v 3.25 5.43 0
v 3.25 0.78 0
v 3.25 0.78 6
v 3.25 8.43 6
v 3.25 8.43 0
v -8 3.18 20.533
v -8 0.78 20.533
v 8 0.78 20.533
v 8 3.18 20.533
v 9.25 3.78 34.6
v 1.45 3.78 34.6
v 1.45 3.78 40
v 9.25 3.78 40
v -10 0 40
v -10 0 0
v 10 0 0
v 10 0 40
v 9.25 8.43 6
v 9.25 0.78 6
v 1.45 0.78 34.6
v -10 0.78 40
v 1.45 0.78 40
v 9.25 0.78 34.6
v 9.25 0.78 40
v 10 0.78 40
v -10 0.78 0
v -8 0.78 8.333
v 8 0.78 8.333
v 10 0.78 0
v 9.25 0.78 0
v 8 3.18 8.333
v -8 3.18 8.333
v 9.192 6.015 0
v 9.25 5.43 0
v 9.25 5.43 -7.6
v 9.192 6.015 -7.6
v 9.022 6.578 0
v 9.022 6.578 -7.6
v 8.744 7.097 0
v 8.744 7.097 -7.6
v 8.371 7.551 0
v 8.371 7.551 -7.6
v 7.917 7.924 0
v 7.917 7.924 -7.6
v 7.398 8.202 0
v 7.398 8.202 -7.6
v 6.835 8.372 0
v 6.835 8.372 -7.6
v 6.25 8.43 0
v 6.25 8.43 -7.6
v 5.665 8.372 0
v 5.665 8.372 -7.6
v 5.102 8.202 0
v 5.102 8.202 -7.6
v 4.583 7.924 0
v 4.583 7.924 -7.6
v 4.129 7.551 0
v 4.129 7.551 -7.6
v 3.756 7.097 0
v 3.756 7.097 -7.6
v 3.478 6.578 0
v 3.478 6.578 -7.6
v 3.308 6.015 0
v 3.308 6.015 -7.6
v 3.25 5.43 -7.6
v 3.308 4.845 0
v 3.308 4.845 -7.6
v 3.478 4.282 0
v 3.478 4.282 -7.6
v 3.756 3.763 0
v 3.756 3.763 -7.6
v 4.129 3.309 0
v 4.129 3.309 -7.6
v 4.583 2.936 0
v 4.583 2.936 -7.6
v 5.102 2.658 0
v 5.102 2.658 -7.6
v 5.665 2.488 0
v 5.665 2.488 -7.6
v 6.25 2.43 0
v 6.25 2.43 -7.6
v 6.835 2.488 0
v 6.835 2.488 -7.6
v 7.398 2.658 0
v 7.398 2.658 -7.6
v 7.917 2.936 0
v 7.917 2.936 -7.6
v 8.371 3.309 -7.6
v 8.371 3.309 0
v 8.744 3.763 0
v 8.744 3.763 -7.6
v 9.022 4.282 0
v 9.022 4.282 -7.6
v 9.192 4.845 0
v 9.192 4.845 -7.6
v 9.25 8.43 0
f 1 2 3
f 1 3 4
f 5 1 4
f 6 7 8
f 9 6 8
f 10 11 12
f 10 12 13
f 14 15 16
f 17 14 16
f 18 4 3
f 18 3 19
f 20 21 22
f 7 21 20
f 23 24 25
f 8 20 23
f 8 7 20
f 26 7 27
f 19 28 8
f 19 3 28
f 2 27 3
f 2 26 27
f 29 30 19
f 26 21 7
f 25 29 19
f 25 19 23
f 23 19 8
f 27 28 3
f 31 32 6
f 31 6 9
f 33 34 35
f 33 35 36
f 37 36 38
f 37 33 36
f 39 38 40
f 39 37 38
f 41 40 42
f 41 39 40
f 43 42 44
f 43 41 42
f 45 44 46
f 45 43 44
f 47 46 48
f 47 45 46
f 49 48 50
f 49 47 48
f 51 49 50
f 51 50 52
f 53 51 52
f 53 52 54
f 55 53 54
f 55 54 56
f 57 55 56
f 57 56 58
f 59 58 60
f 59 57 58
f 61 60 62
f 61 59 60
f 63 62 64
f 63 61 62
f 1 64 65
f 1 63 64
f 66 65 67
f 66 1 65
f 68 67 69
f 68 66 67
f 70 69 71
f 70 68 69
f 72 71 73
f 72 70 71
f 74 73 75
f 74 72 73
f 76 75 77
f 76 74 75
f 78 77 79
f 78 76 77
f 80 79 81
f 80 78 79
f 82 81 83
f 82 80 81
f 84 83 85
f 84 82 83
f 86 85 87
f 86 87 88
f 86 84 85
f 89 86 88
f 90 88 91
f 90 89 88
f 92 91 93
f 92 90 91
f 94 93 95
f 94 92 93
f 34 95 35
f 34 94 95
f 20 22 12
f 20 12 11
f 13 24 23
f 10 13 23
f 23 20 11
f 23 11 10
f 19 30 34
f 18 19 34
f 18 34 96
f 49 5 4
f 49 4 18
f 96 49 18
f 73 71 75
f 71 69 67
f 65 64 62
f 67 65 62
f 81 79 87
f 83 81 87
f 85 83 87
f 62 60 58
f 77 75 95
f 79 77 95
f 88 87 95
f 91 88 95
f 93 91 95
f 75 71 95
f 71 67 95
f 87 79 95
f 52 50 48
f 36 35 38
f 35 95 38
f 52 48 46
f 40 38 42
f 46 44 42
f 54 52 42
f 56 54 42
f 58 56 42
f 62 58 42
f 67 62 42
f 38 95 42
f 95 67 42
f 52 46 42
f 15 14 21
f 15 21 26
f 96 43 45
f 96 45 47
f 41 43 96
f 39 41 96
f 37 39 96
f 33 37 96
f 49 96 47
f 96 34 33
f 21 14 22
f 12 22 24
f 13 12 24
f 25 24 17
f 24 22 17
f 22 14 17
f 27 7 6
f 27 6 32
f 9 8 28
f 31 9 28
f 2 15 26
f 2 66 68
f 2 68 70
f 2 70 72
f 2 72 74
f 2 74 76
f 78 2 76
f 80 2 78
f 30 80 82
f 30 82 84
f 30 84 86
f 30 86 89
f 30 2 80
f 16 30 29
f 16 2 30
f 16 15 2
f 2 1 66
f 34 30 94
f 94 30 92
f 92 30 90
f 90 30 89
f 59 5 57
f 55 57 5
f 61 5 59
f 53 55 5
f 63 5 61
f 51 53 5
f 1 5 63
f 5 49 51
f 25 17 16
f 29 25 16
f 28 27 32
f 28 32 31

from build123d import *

# Parameters (mm, degrees)
SKETCH1_W           = 20
SKETCH1_H           = 40
BOSS_EXTRUDE1_DEPTH = 0.78
SKETCH4_W           = 6
SKETCH4_H           = 7.65
BOSS_EXTRUDE2_DEPTH = 6
SKETCH4_3_R         = 3
BOSS_EXTRUDE3_DEPTH = 7.6
SKETCH5_W           = 7.8
SKETCH5_H           = 5.4
BOSS_EXTRUDE4_DEPTH = 3
SKETCH6_W           = 16
SKETCH6_H           = 12.2
BOSS_EXTRUDE5_DEPTH = 2.4


with BuildPart() as part:
    # Sketch1 → Boss-Extrude1 (new body)
    with BuildSketch(Plane(origin=(0, 0, 0), x_dir=(1, 0, 0), z_dir=(0, 1, 0))):
        with Locations((0, -20)):
            Rectangle(SKETCH1_W, SKETCH1_H)
    extrude(amount=BOSS_EXTRUDE1_DEPTH)

    # Sketch4 → Boss-Extrude2 (add)
    with BuildSketch(Plane.XY):
        with Locations((6.25, 4.605)):
            Rectangle(SKETCH4_W, SKETCH4_H)
    extrude(amount=BOSS_EXTRUDE2_DEPTH)

    # Sketch4<3> → Boss-Extrude3 (add)
    with BuildSketch(Plane.XY):
        with Locations((6.25, 5.43)):
            Circle(SKETCH4_3_R)
    extrude(amount=-BOSS_EXTRUDE3_DEPTH)

    # Sketch5 → Boss-Extrude4 (add)
    with BuildSketch(Plane(origin=(0, 0.78, 0), x_dir=(1, 0, 0), z_dir=(0, 1, 0))):
        with Locations((5.35, -37.3)):
            Rectangle(SKETCH5_W, SKETCH5_H)
    extrude(amount=BOSS_EXTRUDE4_DEPTH)

    # Sketch6 → Boss-Extrude5 (add)
    with BuildSketch(Plane(origin=(0, 0.78, 0), x_dir=(1, 0, 0), z_dir=(0, 1, 0))):
        with Locations((0, -14.432954473)):
            Rectangle(SKETCH6_W, SKETCH6_H)
    extrude(amount=BOSS_EXTRUDE5_DEPTH)


solid = part.part
